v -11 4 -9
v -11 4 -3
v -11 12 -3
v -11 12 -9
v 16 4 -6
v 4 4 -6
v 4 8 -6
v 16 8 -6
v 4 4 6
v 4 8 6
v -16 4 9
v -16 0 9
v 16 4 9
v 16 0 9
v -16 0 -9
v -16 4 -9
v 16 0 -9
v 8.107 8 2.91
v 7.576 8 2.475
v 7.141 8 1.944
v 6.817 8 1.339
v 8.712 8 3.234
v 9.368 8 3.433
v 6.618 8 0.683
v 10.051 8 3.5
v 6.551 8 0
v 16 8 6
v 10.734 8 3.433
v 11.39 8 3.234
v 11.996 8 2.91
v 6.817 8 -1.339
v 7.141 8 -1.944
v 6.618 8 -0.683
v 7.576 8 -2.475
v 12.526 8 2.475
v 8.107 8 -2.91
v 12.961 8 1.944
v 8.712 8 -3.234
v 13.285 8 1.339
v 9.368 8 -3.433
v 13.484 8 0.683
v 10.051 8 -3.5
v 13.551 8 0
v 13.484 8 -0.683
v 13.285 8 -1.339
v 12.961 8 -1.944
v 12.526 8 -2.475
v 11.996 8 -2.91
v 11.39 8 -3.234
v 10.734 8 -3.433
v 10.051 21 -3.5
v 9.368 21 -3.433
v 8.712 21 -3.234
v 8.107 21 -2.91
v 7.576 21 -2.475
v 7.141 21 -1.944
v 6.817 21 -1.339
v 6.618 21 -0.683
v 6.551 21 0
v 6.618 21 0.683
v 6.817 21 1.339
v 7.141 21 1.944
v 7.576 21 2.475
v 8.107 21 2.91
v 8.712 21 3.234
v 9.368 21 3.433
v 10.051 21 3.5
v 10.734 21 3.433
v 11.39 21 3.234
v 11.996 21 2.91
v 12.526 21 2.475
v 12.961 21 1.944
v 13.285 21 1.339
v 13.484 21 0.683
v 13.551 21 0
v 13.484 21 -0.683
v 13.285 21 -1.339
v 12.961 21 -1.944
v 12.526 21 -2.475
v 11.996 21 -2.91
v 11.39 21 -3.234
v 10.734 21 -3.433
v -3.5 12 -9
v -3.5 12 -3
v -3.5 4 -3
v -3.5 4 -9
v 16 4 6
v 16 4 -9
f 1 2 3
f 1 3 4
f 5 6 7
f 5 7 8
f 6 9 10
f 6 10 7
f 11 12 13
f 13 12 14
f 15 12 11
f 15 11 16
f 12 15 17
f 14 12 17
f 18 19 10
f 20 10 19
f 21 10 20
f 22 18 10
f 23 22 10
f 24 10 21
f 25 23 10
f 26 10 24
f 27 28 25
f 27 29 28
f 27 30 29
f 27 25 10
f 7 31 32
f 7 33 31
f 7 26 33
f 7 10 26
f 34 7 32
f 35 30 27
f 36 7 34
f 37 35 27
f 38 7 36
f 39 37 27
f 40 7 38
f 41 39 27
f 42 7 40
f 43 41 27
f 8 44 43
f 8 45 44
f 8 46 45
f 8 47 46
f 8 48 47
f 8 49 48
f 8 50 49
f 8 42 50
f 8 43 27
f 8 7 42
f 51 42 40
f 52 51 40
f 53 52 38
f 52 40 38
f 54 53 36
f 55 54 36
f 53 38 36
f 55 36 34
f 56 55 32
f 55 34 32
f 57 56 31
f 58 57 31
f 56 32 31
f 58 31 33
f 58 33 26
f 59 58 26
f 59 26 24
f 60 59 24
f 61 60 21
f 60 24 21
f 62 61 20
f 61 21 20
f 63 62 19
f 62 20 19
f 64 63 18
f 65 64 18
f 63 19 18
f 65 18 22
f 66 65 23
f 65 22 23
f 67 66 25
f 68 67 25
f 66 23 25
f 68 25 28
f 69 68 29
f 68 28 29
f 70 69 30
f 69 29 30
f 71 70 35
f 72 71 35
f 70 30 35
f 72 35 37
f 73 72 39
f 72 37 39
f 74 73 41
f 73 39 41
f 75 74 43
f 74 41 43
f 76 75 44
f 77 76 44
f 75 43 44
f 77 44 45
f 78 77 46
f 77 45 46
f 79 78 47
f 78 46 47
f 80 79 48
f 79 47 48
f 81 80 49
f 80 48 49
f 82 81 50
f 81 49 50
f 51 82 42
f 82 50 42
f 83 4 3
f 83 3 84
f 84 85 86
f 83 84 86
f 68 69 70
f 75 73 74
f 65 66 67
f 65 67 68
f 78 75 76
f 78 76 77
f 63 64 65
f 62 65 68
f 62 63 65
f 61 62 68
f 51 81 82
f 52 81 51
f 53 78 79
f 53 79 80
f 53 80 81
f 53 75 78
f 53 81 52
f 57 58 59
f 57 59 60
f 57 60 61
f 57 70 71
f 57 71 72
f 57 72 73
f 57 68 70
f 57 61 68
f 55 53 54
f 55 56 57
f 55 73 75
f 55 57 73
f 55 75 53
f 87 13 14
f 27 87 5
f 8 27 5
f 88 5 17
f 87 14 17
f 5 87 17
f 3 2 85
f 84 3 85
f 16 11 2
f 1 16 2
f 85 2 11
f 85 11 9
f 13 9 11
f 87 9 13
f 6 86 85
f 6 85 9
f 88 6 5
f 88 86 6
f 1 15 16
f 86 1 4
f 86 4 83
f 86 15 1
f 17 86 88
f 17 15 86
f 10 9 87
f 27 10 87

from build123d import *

# Parameters (mm, degrees)
SKETCH1_W           = 32
SKETCH1_H           = 18
PCB_DEPTH           = 4
SKETCH2_W           = 7.5
SKETCH2_H           = 6
CONNECTOR_DEPTH     = 8
SKETCH3_W           = 12
SKETCH3_H           = 12
ENCODER_DEPTH       = 4
SKETCH4_R           = 3.5
BOSS_EXTRUDE4_DEPTH = 13


with BuildPart() as part:
    # Sketch1 → PCB (new body)
    with BuildSketch(Plane(origin=(0, 0, 0), x_dir=(1, 0, 0), z_dir=(0, 1, 0))):
        Rectangle(SKETCH1_W, SKETCH1_H)
    extrude(amount=PCB_DEPTH)

    # Sketch2 → Connector (add)
    with BuildSketch(Plane(origin=(0, 4, 0), x_dir=(1, 0, 0), z_dir=(0, 1, 0))):
        with Locations((-7.25, 6)):
            Rectangle(SKETCH2_W, SKETCH2_H)
    extrude(amount=CONNECTOR_DEPTH)

    # Sketch3 → Encoder (add)
    with BuildSketch(Plane(origin=(0, 4, 0), x_dir=(1, 0, 0), z_dir=(0, 1, 0))):
        with Locations((10, 0)):
            Rectangle(SKETCH3_W, SKETCH3_H)
    extrude(amount=ENCODER_DEPTH)

    # Sketch4 → Boss-Extrude4 (add)
    with BuildSketch(Plane(origin=(0, 8, 0), x_dir=(1, 0, 0), z_dir=(0, 1, 0))):
        with Locations(Location((10.051012923, 0, 0), (0, 0, 90))):
            Circle(SKETCH4_R)
    extrude(amount=BOSS_EXTRUDE4_DEPTH)


solid = part.part
